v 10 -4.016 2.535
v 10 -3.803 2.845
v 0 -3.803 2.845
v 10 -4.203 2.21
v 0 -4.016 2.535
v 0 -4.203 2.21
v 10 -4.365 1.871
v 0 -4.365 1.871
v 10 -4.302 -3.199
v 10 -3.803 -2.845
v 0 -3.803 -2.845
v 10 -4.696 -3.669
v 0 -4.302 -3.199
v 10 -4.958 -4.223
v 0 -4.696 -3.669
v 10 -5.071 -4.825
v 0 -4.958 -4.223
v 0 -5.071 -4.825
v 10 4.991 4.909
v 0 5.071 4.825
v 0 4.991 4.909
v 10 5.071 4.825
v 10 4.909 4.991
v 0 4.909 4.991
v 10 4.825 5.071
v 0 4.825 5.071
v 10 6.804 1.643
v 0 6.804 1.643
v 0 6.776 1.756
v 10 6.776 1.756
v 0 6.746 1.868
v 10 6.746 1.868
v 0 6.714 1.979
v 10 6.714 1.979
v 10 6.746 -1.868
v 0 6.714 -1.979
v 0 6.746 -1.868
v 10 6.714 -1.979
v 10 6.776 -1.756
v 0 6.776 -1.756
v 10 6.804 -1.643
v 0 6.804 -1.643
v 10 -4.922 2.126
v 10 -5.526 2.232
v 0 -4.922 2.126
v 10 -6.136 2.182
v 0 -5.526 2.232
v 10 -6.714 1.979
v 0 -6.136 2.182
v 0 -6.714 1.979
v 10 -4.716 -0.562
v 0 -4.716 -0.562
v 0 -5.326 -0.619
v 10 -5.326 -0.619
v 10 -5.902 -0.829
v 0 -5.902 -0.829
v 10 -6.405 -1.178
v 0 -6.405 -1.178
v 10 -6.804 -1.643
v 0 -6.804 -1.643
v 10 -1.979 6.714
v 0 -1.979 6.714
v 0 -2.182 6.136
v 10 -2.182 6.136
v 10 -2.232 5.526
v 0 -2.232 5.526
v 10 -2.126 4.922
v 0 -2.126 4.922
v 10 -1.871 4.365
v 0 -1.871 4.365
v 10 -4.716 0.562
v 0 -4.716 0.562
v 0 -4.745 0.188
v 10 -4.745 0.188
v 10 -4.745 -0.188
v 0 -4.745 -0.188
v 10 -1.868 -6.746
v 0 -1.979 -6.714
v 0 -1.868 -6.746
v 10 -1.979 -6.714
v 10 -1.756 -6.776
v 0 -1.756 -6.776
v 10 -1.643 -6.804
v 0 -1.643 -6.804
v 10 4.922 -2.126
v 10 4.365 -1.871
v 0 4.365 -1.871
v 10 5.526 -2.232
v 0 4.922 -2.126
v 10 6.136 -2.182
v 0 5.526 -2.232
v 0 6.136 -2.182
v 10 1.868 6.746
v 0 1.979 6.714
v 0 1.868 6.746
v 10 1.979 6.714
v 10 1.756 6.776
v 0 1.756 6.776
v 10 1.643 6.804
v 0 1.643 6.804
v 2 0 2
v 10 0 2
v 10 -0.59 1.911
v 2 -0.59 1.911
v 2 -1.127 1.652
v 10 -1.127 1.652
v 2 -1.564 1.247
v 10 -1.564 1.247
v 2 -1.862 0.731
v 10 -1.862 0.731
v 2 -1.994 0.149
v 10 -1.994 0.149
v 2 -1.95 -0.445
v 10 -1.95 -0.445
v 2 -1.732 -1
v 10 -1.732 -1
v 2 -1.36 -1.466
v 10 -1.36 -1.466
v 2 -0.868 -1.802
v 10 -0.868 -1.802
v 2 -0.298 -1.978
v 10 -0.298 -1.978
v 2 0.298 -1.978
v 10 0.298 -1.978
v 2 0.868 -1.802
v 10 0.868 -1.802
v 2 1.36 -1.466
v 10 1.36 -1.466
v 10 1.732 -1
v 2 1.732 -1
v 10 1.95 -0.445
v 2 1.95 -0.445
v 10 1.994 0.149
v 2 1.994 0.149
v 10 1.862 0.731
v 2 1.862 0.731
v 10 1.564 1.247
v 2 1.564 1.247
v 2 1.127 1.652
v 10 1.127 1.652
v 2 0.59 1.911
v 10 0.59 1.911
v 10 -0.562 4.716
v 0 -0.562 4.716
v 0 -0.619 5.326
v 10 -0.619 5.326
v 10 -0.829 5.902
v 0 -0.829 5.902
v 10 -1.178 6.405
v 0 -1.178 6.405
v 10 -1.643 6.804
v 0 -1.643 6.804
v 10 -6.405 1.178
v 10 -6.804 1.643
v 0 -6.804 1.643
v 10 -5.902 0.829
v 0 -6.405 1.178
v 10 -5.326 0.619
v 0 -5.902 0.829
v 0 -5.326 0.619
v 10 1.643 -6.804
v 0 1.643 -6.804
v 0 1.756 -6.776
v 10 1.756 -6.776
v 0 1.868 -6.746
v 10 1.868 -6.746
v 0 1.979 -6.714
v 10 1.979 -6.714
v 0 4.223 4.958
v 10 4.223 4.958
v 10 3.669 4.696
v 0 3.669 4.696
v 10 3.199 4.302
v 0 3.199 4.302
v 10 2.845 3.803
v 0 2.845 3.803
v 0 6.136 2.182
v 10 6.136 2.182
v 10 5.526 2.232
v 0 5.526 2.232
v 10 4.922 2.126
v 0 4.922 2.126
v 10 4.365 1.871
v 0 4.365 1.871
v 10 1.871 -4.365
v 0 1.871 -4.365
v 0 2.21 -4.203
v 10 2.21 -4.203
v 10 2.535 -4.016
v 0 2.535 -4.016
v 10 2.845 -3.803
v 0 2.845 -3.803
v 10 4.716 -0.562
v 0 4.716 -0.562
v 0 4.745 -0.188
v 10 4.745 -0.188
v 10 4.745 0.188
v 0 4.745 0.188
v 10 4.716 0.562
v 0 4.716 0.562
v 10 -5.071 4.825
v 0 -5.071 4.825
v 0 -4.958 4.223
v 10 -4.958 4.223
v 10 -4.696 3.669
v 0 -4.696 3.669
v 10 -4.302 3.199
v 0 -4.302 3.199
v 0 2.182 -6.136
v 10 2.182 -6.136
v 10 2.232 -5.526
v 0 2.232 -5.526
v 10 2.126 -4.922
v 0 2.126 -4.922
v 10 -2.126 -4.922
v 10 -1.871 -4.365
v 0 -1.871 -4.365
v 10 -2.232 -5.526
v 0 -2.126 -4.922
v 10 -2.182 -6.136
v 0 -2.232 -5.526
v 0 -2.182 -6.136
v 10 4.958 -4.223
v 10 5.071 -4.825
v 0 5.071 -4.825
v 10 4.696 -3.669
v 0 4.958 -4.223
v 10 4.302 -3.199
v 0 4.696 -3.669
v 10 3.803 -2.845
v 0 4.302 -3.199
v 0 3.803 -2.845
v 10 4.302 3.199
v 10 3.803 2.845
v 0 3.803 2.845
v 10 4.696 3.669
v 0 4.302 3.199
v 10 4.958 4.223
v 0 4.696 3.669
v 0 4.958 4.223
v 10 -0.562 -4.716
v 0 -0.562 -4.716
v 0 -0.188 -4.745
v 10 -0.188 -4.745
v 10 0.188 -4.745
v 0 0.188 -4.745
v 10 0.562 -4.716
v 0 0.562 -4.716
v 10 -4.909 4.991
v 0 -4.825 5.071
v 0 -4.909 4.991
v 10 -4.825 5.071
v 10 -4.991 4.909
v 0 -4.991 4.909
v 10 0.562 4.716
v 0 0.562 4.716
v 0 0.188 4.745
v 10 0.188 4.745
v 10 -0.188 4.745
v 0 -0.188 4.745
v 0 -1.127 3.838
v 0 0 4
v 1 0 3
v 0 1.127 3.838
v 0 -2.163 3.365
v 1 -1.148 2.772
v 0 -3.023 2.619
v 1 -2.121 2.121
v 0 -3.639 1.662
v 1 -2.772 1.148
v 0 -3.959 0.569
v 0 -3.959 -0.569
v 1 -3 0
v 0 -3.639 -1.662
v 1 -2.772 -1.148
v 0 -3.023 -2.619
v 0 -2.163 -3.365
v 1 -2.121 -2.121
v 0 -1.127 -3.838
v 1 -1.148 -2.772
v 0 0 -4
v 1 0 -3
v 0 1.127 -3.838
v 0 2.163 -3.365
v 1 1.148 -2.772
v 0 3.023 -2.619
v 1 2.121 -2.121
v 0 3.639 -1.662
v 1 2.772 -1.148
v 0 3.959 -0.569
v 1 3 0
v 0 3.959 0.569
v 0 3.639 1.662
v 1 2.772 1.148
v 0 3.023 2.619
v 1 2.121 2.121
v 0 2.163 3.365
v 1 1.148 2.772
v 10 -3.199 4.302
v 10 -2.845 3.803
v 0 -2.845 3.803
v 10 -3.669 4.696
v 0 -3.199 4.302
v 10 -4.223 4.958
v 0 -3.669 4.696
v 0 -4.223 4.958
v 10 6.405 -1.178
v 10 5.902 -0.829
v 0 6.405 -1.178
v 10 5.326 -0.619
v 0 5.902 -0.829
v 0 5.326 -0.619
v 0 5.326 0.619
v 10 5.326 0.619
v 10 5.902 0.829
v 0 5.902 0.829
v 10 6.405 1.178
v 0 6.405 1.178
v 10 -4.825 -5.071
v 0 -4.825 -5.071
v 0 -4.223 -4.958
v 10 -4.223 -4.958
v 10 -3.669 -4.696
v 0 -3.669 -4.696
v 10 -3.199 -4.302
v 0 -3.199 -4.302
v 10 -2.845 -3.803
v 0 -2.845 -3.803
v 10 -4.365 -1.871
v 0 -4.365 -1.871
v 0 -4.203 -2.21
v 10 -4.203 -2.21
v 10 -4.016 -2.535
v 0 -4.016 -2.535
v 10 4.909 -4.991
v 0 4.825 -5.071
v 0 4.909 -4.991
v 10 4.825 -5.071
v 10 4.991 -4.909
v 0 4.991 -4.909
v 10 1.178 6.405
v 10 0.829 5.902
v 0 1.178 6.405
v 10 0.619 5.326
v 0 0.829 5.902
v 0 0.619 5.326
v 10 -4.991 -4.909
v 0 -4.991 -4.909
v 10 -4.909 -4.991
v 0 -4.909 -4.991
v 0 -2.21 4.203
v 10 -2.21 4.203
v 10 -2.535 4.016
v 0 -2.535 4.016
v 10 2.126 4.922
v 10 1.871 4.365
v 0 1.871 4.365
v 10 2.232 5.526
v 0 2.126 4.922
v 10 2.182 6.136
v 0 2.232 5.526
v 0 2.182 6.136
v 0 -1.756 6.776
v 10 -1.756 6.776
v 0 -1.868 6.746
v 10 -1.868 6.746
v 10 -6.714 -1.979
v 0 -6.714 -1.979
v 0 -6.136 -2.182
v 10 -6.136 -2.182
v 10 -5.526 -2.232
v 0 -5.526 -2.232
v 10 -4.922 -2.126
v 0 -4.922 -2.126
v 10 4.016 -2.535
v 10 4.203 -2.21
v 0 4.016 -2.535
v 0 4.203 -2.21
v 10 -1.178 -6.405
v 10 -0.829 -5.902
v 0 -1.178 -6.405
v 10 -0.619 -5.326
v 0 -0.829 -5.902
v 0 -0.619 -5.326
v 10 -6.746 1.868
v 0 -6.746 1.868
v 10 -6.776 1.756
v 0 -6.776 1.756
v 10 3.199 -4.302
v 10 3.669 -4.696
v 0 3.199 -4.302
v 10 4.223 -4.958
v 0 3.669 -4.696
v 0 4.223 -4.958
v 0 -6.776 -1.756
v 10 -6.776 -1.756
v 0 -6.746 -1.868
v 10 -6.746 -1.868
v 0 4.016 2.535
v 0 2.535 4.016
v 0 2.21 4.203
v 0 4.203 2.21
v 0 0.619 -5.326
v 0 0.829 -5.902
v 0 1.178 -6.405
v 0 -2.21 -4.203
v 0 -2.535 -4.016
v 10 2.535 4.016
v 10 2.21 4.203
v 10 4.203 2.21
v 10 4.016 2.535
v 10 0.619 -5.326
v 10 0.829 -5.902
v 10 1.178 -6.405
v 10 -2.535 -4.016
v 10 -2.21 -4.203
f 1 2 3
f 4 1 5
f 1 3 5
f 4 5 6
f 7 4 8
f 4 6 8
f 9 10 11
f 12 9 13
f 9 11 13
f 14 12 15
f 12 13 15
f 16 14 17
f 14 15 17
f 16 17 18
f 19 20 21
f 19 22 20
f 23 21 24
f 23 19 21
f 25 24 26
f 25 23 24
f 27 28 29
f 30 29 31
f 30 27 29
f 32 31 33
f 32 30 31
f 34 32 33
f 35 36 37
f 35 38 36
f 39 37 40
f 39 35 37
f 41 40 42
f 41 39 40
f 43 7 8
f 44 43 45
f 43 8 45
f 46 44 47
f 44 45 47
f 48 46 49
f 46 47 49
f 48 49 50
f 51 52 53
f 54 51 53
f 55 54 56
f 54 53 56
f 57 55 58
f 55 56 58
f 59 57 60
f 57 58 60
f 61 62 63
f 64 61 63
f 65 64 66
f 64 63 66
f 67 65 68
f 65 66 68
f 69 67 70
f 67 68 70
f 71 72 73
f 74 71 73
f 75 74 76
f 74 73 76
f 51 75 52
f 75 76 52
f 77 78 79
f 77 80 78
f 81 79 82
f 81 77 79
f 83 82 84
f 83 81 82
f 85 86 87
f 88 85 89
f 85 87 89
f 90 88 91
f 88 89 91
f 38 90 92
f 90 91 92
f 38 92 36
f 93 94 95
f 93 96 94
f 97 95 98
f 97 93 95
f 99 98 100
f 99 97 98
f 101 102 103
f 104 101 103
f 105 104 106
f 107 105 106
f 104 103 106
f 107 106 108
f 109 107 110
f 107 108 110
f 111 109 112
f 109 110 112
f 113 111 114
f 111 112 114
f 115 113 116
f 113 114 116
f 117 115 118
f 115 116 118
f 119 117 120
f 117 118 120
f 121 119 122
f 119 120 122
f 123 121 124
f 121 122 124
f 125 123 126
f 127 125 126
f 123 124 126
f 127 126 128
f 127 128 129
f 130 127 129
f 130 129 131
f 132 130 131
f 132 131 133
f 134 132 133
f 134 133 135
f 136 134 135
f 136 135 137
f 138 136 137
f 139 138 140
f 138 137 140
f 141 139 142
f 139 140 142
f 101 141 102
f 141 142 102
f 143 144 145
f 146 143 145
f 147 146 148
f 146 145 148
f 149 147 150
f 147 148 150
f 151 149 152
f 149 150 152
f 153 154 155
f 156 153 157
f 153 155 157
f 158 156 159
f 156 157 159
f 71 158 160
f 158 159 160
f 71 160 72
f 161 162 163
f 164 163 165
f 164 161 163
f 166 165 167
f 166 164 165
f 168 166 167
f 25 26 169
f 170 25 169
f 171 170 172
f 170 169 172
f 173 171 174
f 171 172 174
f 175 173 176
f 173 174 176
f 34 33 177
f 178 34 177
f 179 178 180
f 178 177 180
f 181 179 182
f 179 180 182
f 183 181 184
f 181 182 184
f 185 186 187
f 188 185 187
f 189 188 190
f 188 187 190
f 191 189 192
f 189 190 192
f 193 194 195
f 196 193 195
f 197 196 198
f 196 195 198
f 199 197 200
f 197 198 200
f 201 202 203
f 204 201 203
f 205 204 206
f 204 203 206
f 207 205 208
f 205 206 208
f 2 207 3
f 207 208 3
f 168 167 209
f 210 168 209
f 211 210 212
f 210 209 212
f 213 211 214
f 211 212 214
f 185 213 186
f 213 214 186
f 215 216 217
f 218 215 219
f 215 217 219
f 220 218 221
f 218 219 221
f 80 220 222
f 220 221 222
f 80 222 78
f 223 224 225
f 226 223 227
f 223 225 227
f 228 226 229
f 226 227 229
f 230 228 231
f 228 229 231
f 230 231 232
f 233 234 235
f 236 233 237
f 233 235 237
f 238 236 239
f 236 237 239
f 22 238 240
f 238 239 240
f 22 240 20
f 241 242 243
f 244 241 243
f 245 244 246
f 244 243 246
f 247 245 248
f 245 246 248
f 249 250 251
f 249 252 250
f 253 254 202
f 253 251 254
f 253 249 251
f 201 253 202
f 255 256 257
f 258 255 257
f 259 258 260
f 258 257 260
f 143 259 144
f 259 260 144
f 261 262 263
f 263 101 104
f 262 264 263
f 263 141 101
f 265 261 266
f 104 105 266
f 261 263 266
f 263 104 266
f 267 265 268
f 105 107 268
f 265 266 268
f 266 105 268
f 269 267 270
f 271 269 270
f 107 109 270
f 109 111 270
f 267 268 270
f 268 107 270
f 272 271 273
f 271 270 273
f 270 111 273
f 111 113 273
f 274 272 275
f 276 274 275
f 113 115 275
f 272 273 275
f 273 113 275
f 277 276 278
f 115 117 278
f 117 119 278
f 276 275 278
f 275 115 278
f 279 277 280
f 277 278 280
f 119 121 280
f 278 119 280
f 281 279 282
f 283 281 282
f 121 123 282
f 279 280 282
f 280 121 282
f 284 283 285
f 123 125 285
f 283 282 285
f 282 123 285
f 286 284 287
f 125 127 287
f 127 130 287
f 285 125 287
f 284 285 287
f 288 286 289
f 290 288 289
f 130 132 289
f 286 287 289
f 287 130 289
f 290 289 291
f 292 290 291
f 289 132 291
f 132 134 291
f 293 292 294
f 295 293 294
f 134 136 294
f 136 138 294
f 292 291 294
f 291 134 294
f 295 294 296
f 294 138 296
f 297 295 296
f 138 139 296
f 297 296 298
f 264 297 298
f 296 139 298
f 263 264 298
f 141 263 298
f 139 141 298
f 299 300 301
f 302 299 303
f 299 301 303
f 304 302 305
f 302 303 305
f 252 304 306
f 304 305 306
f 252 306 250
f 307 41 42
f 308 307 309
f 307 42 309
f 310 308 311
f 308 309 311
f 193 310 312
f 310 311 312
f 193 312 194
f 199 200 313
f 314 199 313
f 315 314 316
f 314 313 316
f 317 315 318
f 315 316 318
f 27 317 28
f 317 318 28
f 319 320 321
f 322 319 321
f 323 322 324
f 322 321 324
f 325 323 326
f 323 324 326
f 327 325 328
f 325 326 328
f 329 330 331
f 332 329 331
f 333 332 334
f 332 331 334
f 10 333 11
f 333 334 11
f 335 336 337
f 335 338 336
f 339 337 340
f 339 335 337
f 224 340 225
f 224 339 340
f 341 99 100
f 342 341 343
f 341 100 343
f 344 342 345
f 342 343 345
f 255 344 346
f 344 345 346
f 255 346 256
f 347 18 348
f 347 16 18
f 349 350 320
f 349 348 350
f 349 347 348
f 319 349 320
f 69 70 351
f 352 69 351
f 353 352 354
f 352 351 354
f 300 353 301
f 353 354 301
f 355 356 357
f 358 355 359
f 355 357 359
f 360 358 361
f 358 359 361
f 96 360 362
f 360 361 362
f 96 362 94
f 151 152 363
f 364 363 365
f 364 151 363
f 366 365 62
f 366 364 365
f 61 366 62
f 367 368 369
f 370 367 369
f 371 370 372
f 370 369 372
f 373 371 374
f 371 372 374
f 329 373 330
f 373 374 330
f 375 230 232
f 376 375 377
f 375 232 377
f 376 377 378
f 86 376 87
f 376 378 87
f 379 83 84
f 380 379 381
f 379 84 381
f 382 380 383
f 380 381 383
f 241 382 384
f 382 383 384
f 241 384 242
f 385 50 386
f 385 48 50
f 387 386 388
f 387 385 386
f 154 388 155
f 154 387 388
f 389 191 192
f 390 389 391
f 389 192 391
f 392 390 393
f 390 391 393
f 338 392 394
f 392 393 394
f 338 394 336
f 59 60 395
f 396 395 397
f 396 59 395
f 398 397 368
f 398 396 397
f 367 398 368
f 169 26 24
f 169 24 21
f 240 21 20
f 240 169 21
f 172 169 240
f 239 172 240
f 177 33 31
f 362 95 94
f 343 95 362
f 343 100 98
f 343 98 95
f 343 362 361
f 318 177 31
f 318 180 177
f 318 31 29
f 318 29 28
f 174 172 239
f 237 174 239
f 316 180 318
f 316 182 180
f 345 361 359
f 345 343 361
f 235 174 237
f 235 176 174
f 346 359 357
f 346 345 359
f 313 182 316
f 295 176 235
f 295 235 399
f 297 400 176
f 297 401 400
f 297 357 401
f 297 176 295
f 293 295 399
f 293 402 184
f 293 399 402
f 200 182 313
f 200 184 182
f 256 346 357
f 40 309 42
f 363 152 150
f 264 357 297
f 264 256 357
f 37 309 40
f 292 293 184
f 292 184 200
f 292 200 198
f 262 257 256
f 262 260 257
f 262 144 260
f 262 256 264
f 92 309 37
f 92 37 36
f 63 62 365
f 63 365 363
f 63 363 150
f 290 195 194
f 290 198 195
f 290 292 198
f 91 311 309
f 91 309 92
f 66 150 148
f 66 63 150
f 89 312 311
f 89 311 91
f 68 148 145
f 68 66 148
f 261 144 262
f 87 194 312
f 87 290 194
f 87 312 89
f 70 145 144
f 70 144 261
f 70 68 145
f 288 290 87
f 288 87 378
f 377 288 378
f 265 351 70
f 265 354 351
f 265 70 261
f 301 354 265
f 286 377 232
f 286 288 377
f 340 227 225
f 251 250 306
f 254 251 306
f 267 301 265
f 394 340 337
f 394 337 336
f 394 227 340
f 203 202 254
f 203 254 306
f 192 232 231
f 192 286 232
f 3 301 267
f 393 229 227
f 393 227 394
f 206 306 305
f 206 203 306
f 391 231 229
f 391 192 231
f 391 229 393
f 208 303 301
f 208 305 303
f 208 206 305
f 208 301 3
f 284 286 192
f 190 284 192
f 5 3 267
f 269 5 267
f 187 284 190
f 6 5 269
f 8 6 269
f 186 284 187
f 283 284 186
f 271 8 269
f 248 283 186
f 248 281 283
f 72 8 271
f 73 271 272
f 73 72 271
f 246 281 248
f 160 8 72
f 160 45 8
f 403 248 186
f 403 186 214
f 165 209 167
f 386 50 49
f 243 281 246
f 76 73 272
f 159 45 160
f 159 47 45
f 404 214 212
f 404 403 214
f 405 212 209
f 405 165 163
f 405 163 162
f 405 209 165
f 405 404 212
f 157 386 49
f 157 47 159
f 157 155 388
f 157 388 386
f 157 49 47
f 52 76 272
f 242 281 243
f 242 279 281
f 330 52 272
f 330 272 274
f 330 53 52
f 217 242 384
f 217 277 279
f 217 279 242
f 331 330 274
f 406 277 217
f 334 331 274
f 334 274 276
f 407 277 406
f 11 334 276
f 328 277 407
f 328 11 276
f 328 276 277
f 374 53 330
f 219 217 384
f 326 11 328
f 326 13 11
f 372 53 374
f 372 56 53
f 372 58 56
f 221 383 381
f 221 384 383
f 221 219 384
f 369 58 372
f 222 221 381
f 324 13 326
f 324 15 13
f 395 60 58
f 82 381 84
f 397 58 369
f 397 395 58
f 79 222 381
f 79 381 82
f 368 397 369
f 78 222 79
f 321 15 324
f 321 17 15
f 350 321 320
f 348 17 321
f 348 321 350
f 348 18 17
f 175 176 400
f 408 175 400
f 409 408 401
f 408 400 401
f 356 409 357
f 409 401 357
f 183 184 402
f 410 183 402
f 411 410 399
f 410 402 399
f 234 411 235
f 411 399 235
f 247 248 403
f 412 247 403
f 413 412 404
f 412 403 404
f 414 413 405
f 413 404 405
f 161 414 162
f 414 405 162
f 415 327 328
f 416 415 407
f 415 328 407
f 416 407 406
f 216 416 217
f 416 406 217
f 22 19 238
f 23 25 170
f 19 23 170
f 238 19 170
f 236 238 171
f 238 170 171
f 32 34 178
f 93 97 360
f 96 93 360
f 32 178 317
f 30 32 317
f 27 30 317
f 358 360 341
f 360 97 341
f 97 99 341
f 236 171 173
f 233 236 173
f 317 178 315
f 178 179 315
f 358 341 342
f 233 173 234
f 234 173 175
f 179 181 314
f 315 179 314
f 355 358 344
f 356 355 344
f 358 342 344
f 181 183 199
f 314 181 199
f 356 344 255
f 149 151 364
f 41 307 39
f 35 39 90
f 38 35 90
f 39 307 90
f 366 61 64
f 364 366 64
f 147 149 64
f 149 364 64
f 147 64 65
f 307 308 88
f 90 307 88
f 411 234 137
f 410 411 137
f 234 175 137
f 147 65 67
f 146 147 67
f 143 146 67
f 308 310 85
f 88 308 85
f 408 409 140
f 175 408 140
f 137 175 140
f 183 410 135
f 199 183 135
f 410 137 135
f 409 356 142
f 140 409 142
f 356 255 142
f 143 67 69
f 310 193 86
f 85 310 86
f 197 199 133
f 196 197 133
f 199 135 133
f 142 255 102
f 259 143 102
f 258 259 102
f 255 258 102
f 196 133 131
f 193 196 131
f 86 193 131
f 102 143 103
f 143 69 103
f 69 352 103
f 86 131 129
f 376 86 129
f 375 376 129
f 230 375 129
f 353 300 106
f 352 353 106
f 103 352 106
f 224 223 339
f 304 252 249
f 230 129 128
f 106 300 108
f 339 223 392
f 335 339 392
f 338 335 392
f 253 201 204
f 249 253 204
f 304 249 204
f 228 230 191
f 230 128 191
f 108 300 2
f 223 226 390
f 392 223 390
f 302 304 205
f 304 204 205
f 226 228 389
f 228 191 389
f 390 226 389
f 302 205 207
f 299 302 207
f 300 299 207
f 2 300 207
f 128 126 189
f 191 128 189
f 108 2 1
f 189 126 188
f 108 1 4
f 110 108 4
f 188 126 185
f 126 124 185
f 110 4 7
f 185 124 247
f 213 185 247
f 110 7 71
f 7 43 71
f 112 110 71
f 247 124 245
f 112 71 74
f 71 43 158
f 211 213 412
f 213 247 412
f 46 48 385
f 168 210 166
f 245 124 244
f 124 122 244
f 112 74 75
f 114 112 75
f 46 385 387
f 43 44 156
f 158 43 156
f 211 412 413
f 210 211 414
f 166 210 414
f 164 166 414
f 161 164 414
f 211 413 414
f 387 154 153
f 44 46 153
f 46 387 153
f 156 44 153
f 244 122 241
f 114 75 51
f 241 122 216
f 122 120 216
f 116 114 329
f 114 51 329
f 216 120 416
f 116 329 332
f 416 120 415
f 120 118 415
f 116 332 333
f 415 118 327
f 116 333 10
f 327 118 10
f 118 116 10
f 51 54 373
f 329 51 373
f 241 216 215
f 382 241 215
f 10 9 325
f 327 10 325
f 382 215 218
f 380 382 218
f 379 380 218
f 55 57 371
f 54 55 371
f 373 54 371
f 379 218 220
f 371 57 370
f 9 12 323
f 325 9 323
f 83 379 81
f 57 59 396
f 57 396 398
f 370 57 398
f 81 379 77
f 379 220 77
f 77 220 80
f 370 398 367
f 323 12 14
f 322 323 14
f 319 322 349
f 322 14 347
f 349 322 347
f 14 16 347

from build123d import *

# Parameters (mm, degrees)
BASPROSKE_W     = 10
BASPROSKE_H     = 7
TOOTHCUT_DEPTH  = 15.071247279
TEETHCUTS_COUNT = 12
TEETHCUTS_ANGLE = 330
BORSKE_R        = 2
BORE_DEPTH      = 50.0000508
CHAMFER_1_SIZE  = 2


with BuildPart() as part:
    # BasProSke → Base-Revolve (revolve)
    with BuildSketch(Plane(origin=(0, 0, 0), x_dir=(1, 0, 0), z_dir=(0, 1, 0)), mode=Mode.PRIVATE) as base_revolve_sk:
        with Locations((5, 3.5)):
            Rectangle(BASPROSKE_W, BASPROSKE_H)
    revolve(base_revolve_sk.sketch.rotate(Axis((-10, 0, 0), (1, 0, 0)), 180), axis=Axis((-10, 0, 0), (1, 0, 0)))

    # TooCutSke → ToothCut (cut, through all)
    with BuildSketch(Plane(origin=(0, 0, 0), x_dir=(0, 0, -1), z_dir=(1, 0, 0))):
        with BuildLine():
            ThreePointArc((0.562207301, 4.715604304), (0, 4.749), (-0.562207301, 4.715604304))
            ThreePointArc((-0.562207301, 4.715604304), (-0.837528627, 5.917009812), (-1.672850686, 6.823328788))
            ThreePointArc((-1.672850686, 6.823328788), (0, 7.0254), (1.672850686, 6.823328788))
            ThreePointArc((1.672850686, 6.823328788), (0.837528627, 5.917009812), (0.562207301, 4.715604304))
        make_face()
    toothcut = extrude(amount=TOOTHCUT_DEPTH, mode=Mode.SUBTRACT)

    # TeethCuts: ToothCut ×12 about axis
    teethcuts_axis = Axis((-10, 0, 0), (1, 0, 0))
    for i in range(1, TEETHCUTS_COUNT):
        add(toothcut.rotate(teethcuts_axis, i * TEETHCUTS_ANGLE / (TEETHCUTS_COUNT - 1)), mode=Mode.SUBTRACT)

    # BorSke → Bore (cut, symmetric)
    with BuildSketch(Plane(origin=(0, 0, 0), x_dir=(0, 0, -1), z_dir=(1, 0, 0))):
        with Locations(Location((0, 0, 0), (0, 0, 180))):
            Circle(BORSKE_R)
    extrude(amount=BORE_DEPTH, both=True, mode=Mode.SUBTRACT)

    # 倒角1
    chamfer_1_edges = [part.edges().sort_by_distance(p)[0] for p in [
        (0, 0, -2),
    ]]
    chamfer(chamfer_1_edges, length=CHAMFER_1_SIZE)


solid = part.part
